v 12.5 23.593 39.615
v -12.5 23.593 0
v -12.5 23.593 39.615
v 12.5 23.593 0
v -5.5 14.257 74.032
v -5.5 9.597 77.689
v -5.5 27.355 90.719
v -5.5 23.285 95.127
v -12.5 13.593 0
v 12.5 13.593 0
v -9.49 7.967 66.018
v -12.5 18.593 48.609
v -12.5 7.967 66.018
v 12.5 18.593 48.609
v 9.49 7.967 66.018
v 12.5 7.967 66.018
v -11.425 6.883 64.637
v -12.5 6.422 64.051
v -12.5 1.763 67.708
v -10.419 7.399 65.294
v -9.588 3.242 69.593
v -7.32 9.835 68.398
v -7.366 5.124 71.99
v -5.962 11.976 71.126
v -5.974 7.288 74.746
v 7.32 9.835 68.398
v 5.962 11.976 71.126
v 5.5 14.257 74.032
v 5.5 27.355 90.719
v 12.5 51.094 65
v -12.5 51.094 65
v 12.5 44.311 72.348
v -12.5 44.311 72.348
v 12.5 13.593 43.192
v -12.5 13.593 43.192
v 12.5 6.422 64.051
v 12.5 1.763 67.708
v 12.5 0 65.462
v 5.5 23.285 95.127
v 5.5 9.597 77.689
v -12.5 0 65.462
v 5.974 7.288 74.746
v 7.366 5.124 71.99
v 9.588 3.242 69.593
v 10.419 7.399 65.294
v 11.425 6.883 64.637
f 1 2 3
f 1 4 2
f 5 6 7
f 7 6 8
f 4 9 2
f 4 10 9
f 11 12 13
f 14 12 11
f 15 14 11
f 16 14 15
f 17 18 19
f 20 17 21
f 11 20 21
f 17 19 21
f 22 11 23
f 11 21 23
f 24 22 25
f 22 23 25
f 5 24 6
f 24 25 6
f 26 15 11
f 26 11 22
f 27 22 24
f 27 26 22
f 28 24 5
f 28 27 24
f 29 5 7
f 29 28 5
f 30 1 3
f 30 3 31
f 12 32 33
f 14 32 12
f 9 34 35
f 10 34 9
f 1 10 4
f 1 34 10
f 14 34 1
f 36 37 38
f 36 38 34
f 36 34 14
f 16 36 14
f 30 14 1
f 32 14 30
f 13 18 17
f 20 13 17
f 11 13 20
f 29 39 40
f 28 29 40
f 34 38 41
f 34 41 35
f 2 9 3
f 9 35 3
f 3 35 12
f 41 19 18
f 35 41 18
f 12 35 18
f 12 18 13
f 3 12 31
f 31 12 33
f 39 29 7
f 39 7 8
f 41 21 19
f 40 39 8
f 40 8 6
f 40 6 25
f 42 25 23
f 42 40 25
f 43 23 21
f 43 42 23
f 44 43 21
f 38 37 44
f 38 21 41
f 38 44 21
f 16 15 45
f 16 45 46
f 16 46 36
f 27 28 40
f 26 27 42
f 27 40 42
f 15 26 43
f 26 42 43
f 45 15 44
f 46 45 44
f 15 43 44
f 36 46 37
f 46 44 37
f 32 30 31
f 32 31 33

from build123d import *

# Parameters (mm, degrees)
F1_DEPTH = 12.5
F2_R     = 15
F3_DEPTH = 5.9234467243


with BuildPart() as f1:
    # F0 (on Right) → F1 (new body, symmetric)
    with BuildSketch(Plane.YZ):
        Polygon((23.5929106708, 0), (23.5929106708, 39.6152098016), (51.0941416978, 65), (44.3114793878, 72.3481624906), (18.5929106708, 48.6088444054), (7.9668510469, 66.0182343106), (27.3548236127, 90.718568717), (23.2852262267, 95.1274662114), (0, 65.4620191113), (13.5929106708, 43.1918371068), (13.5929106708, 0), align=None)
    extrude(amount=F1_DEPTH, both=True)

    # F2 (on face) → F3 (cut, through all)
    with BuildSketch(Plane(origin=(0, -31.7941860417, 24.9561320338), x_dir=(1, 0, 0), z_dir=(0, -0.7866188975, 0.6174388311))):
        with Locations((-20.5, 67.0375549689)):
            Circle(F2_R)
        with BuildLine():
            ThreePointArc((35.5, 67.0375549689), (20.5, 82.0375549689), (5.5, 67.0375549689))
            ThreePointArc((5.5, 67.0375549689), (20.5, 52.0375549689), (35.5, 67.0375549689))
        make_face()
        with BuildLine():
            ThreePointArc((-12.5, 79.7261325093), (-7.3660744634, 74.283243342), (-5.5, 67.0375549689))
            Line((-5.5, 67.0375549689), (-5.5, 89.206265453))
            Line((-5.5, 89.206265453), (-12.5, 89.206265453))
            Line((-12.5, 89.206265453), (-12.5, 79.7261325093))
        make_face()
        with BuildLine():
            Line((12.5, 89.206265453), (5.5, 89.206265453))
            Line((5.5, 89.206265453), (5.5, 67.0375549689))
            ThreePointArc((5.5, 67.0375549689), (7.3660744634, 74.283243342), (12.5, 79.7261325093))
            Line((12.5, 79.7261325094), (12.5, 89.206265453))
        make_face()
    extrude(amount=-F3_DEPTH, mode=Mode.SUBTRACT)


solid = f1.part
